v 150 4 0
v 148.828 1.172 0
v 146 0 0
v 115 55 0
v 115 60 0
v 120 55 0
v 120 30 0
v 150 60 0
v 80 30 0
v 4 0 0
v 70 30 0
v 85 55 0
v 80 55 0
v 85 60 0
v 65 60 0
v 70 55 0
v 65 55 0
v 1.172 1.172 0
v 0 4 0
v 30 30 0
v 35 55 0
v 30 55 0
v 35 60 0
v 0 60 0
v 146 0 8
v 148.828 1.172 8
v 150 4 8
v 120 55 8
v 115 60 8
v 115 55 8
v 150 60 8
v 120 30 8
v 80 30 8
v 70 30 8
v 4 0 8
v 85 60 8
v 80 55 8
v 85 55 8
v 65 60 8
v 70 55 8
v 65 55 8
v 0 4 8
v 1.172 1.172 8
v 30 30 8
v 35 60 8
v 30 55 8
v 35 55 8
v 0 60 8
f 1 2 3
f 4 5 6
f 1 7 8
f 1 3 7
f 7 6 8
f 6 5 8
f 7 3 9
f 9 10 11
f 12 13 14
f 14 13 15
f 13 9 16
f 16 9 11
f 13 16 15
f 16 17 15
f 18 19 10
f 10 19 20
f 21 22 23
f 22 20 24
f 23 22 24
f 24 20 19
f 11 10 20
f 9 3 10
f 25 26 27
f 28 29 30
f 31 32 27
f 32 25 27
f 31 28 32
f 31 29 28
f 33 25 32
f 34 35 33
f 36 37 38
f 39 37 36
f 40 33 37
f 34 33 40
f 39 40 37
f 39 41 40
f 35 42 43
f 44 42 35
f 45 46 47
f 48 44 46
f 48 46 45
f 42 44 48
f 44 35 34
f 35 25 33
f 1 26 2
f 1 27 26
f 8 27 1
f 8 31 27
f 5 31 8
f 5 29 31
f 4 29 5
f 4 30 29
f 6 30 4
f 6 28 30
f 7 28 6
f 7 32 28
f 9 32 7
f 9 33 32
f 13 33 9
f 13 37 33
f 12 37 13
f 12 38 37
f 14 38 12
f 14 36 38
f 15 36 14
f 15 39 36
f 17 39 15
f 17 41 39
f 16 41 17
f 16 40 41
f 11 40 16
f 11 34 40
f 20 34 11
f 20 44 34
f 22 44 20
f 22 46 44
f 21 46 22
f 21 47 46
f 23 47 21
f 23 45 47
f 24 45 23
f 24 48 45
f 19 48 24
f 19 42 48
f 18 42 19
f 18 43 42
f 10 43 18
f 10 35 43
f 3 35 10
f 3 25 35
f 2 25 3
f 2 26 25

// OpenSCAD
$fn = 32;

// ----------------------------------------------------------------------
// Oversize slot bar: 150 mm bar with 2 oversize windows
// ----------------------------------------------------------------------

// --- parameters (mm) ---
profile_height = 8;       // extrusion height
profile_points = 24;      // points of the closed outline

profile = [[0, 4], [1.172, 1.172], [4, 0], [146, 0], [148.828, 1.172], [150, 4], [150, 60], [115, 60], [115, 55], [120, 55], [120, 30], [80, 30], [80, 55], [85, 55], [85, 60], [65, 60], [65, 55], [70, 55], [70, 30], [30, 30], [30, 55], [35, 55], [35, 60], [0, 60]];  // single closed polygon, 24 points, counter clockwise

// --- the one profile operation ---
linear_extrude(height = profile_height) polygon(points = profile);
